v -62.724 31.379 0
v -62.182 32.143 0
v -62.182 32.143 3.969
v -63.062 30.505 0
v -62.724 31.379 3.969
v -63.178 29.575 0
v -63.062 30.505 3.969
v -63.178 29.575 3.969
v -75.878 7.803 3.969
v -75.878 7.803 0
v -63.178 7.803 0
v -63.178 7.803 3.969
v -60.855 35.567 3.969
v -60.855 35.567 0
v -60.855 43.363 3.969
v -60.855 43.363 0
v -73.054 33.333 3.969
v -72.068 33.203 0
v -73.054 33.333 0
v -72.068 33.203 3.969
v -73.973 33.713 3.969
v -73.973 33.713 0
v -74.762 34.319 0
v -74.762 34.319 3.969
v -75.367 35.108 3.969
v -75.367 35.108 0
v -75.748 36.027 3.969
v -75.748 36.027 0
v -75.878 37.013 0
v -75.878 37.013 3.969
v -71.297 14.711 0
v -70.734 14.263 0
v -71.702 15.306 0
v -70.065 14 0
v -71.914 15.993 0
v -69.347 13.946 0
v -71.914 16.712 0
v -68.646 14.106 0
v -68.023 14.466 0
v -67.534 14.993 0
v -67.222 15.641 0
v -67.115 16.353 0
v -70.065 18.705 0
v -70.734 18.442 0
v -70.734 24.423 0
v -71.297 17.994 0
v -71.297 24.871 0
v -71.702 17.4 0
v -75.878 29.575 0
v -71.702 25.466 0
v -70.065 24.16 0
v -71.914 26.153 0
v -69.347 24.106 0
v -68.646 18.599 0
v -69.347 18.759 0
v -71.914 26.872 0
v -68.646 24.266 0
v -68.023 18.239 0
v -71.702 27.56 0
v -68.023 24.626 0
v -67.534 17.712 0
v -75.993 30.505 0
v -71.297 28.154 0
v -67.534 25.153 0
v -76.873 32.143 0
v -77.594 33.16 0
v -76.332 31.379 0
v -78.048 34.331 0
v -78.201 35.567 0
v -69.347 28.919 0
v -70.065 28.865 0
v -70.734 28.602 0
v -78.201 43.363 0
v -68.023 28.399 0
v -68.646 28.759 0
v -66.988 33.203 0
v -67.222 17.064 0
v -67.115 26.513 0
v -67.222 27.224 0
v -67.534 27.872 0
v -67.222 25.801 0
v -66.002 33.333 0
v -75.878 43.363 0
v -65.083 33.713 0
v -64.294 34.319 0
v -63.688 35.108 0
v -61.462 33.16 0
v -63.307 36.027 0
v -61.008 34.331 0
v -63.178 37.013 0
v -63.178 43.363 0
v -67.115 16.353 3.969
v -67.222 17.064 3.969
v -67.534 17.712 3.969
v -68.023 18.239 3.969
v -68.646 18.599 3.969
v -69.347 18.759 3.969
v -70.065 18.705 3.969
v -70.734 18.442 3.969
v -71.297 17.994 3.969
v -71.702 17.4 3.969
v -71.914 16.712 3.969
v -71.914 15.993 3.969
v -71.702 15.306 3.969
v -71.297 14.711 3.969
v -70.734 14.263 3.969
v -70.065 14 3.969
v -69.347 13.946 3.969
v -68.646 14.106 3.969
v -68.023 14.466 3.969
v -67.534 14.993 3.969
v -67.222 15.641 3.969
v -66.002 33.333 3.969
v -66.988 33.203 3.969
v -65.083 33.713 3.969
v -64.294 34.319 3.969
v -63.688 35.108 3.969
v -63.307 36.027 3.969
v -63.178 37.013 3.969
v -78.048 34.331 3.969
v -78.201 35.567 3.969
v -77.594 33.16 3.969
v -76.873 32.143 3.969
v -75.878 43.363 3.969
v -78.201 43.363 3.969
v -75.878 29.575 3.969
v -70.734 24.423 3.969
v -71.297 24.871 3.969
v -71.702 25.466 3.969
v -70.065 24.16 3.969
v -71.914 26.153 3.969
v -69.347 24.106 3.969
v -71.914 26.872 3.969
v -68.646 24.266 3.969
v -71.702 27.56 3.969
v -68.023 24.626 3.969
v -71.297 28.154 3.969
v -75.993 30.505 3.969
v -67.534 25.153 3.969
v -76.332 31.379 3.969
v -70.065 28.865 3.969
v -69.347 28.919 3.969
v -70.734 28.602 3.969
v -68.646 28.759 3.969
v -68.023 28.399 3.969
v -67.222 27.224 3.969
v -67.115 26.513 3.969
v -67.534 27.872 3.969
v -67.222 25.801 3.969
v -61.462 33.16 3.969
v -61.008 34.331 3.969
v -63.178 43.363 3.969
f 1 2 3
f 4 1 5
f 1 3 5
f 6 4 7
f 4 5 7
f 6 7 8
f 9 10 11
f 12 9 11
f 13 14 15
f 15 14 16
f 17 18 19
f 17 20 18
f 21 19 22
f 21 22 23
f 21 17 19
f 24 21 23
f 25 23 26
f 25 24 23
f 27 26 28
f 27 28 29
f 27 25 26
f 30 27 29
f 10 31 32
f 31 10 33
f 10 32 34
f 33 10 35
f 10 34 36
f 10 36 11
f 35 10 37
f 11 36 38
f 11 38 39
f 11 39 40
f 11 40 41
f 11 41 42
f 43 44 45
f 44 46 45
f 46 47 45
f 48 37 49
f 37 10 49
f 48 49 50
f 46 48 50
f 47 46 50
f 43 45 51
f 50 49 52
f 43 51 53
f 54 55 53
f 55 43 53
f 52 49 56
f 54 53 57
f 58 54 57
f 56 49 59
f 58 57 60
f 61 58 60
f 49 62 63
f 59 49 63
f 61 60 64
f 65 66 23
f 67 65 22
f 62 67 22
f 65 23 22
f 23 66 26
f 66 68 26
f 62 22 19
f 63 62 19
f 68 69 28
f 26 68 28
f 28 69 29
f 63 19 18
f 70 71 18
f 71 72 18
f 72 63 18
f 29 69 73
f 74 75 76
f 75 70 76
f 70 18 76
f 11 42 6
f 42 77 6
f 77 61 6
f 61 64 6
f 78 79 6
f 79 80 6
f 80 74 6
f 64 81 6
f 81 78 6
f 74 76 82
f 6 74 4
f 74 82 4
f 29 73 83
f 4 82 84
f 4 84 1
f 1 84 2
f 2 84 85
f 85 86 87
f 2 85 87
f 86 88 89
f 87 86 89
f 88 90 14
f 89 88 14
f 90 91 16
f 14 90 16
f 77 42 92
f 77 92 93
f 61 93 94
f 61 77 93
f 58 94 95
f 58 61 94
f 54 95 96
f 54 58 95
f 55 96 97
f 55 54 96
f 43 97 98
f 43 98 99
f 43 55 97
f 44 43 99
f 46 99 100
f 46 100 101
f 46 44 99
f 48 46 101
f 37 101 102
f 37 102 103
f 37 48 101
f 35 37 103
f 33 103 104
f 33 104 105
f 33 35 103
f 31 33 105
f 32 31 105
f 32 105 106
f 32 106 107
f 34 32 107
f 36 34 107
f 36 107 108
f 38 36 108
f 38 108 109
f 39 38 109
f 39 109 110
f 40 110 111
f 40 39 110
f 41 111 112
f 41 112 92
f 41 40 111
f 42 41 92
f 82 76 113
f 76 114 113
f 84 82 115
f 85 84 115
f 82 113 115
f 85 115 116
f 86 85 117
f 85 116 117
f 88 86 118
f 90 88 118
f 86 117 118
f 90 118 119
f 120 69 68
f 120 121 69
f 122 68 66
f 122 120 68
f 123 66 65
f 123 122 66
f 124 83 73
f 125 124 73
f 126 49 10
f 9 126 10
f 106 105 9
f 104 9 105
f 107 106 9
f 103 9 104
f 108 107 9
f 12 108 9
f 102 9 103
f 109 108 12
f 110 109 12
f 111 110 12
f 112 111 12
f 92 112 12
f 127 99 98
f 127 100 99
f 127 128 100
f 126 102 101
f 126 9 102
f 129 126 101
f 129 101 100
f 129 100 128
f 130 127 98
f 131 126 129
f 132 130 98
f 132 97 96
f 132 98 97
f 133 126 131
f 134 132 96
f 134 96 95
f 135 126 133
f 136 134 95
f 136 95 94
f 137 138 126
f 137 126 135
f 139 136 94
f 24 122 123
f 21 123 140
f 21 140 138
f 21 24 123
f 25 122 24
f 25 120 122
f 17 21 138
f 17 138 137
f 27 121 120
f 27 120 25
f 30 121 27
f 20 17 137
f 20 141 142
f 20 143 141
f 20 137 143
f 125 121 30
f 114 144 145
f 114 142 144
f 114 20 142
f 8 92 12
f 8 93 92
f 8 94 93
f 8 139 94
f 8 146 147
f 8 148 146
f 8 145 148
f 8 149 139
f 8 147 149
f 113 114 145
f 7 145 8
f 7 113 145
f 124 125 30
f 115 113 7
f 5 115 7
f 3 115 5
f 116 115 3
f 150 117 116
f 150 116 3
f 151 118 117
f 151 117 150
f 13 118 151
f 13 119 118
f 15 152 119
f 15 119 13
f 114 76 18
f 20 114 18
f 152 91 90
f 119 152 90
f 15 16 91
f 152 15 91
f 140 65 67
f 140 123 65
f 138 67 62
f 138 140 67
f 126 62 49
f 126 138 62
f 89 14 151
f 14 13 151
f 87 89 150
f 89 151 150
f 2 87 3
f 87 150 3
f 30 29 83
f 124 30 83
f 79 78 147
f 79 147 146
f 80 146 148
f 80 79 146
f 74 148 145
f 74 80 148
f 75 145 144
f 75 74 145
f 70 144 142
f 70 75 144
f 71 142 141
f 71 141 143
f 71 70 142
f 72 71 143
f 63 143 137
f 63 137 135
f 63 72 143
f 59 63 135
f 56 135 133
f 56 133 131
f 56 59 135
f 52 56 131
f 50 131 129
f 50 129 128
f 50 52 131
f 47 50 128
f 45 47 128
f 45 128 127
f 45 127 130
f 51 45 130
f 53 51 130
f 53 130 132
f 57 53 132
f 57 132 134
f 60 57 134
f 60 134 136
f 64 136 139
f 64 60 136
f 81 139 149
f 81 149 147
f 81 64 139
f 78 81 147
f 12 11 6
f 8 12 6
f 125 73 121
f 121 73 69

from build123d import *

# Parameters (mm, degrees)
F0_R     = 2.413
F1_DEPTH = 3.96875
F2_R     = 3.81
F3_R     = 5.08


with BuildPart() as f1:
    # F0 (on Top) → F1 (new body)
    with BuildSketch(Plane.XY):
        Polygon((-63.177648, 33.202958), (-75.877648, 33.202958), (-75.877648, 43.362958), (-78.200534, 43.362958), (-78.200534, 33.202958), (-75.877648, 31.518605), (-75.877648, 7.802958), (-63.177648, 7.802958), (-63.177648, 31.518605), (-60.854763, 33.202958), (-60.854763, 43.362958), (-63.177648, 43.362958), align=None)
        with Locations((-69.527648, 16.35256)):
            Circle(F0_R, mode=Mode.SUBTRACT)
        with Locations((-69.527648, 26.51256)):
            Circle(F0_R, mode=Mode.SUBTRACT)
    extrude(amount=F1_DEPTH)

    # F2
    f2_edges = [f1.edges().sort_by_distance(p)[0] for p in [
        (-63.177648, 31.518605, 1.984375),
        (-75.877648, 31.518605, 1.984375),
        (-63.177648, 33.202958, 1.984375),
        (-75.877648, 33.202958, 1.984375),
    ]]
    fillet(f2_edges, radius=F2_R)

    # F3
    f3_edges = [f1.edges().sort_by_distance(p)[0] for p in [
        (-78.200534, 33.202958, 1.984375),
        (-60.854763, 33.202958, 1.984375),
    ]]
    fillet(f3_edges, radius=F3_R)


solid = f1.part
